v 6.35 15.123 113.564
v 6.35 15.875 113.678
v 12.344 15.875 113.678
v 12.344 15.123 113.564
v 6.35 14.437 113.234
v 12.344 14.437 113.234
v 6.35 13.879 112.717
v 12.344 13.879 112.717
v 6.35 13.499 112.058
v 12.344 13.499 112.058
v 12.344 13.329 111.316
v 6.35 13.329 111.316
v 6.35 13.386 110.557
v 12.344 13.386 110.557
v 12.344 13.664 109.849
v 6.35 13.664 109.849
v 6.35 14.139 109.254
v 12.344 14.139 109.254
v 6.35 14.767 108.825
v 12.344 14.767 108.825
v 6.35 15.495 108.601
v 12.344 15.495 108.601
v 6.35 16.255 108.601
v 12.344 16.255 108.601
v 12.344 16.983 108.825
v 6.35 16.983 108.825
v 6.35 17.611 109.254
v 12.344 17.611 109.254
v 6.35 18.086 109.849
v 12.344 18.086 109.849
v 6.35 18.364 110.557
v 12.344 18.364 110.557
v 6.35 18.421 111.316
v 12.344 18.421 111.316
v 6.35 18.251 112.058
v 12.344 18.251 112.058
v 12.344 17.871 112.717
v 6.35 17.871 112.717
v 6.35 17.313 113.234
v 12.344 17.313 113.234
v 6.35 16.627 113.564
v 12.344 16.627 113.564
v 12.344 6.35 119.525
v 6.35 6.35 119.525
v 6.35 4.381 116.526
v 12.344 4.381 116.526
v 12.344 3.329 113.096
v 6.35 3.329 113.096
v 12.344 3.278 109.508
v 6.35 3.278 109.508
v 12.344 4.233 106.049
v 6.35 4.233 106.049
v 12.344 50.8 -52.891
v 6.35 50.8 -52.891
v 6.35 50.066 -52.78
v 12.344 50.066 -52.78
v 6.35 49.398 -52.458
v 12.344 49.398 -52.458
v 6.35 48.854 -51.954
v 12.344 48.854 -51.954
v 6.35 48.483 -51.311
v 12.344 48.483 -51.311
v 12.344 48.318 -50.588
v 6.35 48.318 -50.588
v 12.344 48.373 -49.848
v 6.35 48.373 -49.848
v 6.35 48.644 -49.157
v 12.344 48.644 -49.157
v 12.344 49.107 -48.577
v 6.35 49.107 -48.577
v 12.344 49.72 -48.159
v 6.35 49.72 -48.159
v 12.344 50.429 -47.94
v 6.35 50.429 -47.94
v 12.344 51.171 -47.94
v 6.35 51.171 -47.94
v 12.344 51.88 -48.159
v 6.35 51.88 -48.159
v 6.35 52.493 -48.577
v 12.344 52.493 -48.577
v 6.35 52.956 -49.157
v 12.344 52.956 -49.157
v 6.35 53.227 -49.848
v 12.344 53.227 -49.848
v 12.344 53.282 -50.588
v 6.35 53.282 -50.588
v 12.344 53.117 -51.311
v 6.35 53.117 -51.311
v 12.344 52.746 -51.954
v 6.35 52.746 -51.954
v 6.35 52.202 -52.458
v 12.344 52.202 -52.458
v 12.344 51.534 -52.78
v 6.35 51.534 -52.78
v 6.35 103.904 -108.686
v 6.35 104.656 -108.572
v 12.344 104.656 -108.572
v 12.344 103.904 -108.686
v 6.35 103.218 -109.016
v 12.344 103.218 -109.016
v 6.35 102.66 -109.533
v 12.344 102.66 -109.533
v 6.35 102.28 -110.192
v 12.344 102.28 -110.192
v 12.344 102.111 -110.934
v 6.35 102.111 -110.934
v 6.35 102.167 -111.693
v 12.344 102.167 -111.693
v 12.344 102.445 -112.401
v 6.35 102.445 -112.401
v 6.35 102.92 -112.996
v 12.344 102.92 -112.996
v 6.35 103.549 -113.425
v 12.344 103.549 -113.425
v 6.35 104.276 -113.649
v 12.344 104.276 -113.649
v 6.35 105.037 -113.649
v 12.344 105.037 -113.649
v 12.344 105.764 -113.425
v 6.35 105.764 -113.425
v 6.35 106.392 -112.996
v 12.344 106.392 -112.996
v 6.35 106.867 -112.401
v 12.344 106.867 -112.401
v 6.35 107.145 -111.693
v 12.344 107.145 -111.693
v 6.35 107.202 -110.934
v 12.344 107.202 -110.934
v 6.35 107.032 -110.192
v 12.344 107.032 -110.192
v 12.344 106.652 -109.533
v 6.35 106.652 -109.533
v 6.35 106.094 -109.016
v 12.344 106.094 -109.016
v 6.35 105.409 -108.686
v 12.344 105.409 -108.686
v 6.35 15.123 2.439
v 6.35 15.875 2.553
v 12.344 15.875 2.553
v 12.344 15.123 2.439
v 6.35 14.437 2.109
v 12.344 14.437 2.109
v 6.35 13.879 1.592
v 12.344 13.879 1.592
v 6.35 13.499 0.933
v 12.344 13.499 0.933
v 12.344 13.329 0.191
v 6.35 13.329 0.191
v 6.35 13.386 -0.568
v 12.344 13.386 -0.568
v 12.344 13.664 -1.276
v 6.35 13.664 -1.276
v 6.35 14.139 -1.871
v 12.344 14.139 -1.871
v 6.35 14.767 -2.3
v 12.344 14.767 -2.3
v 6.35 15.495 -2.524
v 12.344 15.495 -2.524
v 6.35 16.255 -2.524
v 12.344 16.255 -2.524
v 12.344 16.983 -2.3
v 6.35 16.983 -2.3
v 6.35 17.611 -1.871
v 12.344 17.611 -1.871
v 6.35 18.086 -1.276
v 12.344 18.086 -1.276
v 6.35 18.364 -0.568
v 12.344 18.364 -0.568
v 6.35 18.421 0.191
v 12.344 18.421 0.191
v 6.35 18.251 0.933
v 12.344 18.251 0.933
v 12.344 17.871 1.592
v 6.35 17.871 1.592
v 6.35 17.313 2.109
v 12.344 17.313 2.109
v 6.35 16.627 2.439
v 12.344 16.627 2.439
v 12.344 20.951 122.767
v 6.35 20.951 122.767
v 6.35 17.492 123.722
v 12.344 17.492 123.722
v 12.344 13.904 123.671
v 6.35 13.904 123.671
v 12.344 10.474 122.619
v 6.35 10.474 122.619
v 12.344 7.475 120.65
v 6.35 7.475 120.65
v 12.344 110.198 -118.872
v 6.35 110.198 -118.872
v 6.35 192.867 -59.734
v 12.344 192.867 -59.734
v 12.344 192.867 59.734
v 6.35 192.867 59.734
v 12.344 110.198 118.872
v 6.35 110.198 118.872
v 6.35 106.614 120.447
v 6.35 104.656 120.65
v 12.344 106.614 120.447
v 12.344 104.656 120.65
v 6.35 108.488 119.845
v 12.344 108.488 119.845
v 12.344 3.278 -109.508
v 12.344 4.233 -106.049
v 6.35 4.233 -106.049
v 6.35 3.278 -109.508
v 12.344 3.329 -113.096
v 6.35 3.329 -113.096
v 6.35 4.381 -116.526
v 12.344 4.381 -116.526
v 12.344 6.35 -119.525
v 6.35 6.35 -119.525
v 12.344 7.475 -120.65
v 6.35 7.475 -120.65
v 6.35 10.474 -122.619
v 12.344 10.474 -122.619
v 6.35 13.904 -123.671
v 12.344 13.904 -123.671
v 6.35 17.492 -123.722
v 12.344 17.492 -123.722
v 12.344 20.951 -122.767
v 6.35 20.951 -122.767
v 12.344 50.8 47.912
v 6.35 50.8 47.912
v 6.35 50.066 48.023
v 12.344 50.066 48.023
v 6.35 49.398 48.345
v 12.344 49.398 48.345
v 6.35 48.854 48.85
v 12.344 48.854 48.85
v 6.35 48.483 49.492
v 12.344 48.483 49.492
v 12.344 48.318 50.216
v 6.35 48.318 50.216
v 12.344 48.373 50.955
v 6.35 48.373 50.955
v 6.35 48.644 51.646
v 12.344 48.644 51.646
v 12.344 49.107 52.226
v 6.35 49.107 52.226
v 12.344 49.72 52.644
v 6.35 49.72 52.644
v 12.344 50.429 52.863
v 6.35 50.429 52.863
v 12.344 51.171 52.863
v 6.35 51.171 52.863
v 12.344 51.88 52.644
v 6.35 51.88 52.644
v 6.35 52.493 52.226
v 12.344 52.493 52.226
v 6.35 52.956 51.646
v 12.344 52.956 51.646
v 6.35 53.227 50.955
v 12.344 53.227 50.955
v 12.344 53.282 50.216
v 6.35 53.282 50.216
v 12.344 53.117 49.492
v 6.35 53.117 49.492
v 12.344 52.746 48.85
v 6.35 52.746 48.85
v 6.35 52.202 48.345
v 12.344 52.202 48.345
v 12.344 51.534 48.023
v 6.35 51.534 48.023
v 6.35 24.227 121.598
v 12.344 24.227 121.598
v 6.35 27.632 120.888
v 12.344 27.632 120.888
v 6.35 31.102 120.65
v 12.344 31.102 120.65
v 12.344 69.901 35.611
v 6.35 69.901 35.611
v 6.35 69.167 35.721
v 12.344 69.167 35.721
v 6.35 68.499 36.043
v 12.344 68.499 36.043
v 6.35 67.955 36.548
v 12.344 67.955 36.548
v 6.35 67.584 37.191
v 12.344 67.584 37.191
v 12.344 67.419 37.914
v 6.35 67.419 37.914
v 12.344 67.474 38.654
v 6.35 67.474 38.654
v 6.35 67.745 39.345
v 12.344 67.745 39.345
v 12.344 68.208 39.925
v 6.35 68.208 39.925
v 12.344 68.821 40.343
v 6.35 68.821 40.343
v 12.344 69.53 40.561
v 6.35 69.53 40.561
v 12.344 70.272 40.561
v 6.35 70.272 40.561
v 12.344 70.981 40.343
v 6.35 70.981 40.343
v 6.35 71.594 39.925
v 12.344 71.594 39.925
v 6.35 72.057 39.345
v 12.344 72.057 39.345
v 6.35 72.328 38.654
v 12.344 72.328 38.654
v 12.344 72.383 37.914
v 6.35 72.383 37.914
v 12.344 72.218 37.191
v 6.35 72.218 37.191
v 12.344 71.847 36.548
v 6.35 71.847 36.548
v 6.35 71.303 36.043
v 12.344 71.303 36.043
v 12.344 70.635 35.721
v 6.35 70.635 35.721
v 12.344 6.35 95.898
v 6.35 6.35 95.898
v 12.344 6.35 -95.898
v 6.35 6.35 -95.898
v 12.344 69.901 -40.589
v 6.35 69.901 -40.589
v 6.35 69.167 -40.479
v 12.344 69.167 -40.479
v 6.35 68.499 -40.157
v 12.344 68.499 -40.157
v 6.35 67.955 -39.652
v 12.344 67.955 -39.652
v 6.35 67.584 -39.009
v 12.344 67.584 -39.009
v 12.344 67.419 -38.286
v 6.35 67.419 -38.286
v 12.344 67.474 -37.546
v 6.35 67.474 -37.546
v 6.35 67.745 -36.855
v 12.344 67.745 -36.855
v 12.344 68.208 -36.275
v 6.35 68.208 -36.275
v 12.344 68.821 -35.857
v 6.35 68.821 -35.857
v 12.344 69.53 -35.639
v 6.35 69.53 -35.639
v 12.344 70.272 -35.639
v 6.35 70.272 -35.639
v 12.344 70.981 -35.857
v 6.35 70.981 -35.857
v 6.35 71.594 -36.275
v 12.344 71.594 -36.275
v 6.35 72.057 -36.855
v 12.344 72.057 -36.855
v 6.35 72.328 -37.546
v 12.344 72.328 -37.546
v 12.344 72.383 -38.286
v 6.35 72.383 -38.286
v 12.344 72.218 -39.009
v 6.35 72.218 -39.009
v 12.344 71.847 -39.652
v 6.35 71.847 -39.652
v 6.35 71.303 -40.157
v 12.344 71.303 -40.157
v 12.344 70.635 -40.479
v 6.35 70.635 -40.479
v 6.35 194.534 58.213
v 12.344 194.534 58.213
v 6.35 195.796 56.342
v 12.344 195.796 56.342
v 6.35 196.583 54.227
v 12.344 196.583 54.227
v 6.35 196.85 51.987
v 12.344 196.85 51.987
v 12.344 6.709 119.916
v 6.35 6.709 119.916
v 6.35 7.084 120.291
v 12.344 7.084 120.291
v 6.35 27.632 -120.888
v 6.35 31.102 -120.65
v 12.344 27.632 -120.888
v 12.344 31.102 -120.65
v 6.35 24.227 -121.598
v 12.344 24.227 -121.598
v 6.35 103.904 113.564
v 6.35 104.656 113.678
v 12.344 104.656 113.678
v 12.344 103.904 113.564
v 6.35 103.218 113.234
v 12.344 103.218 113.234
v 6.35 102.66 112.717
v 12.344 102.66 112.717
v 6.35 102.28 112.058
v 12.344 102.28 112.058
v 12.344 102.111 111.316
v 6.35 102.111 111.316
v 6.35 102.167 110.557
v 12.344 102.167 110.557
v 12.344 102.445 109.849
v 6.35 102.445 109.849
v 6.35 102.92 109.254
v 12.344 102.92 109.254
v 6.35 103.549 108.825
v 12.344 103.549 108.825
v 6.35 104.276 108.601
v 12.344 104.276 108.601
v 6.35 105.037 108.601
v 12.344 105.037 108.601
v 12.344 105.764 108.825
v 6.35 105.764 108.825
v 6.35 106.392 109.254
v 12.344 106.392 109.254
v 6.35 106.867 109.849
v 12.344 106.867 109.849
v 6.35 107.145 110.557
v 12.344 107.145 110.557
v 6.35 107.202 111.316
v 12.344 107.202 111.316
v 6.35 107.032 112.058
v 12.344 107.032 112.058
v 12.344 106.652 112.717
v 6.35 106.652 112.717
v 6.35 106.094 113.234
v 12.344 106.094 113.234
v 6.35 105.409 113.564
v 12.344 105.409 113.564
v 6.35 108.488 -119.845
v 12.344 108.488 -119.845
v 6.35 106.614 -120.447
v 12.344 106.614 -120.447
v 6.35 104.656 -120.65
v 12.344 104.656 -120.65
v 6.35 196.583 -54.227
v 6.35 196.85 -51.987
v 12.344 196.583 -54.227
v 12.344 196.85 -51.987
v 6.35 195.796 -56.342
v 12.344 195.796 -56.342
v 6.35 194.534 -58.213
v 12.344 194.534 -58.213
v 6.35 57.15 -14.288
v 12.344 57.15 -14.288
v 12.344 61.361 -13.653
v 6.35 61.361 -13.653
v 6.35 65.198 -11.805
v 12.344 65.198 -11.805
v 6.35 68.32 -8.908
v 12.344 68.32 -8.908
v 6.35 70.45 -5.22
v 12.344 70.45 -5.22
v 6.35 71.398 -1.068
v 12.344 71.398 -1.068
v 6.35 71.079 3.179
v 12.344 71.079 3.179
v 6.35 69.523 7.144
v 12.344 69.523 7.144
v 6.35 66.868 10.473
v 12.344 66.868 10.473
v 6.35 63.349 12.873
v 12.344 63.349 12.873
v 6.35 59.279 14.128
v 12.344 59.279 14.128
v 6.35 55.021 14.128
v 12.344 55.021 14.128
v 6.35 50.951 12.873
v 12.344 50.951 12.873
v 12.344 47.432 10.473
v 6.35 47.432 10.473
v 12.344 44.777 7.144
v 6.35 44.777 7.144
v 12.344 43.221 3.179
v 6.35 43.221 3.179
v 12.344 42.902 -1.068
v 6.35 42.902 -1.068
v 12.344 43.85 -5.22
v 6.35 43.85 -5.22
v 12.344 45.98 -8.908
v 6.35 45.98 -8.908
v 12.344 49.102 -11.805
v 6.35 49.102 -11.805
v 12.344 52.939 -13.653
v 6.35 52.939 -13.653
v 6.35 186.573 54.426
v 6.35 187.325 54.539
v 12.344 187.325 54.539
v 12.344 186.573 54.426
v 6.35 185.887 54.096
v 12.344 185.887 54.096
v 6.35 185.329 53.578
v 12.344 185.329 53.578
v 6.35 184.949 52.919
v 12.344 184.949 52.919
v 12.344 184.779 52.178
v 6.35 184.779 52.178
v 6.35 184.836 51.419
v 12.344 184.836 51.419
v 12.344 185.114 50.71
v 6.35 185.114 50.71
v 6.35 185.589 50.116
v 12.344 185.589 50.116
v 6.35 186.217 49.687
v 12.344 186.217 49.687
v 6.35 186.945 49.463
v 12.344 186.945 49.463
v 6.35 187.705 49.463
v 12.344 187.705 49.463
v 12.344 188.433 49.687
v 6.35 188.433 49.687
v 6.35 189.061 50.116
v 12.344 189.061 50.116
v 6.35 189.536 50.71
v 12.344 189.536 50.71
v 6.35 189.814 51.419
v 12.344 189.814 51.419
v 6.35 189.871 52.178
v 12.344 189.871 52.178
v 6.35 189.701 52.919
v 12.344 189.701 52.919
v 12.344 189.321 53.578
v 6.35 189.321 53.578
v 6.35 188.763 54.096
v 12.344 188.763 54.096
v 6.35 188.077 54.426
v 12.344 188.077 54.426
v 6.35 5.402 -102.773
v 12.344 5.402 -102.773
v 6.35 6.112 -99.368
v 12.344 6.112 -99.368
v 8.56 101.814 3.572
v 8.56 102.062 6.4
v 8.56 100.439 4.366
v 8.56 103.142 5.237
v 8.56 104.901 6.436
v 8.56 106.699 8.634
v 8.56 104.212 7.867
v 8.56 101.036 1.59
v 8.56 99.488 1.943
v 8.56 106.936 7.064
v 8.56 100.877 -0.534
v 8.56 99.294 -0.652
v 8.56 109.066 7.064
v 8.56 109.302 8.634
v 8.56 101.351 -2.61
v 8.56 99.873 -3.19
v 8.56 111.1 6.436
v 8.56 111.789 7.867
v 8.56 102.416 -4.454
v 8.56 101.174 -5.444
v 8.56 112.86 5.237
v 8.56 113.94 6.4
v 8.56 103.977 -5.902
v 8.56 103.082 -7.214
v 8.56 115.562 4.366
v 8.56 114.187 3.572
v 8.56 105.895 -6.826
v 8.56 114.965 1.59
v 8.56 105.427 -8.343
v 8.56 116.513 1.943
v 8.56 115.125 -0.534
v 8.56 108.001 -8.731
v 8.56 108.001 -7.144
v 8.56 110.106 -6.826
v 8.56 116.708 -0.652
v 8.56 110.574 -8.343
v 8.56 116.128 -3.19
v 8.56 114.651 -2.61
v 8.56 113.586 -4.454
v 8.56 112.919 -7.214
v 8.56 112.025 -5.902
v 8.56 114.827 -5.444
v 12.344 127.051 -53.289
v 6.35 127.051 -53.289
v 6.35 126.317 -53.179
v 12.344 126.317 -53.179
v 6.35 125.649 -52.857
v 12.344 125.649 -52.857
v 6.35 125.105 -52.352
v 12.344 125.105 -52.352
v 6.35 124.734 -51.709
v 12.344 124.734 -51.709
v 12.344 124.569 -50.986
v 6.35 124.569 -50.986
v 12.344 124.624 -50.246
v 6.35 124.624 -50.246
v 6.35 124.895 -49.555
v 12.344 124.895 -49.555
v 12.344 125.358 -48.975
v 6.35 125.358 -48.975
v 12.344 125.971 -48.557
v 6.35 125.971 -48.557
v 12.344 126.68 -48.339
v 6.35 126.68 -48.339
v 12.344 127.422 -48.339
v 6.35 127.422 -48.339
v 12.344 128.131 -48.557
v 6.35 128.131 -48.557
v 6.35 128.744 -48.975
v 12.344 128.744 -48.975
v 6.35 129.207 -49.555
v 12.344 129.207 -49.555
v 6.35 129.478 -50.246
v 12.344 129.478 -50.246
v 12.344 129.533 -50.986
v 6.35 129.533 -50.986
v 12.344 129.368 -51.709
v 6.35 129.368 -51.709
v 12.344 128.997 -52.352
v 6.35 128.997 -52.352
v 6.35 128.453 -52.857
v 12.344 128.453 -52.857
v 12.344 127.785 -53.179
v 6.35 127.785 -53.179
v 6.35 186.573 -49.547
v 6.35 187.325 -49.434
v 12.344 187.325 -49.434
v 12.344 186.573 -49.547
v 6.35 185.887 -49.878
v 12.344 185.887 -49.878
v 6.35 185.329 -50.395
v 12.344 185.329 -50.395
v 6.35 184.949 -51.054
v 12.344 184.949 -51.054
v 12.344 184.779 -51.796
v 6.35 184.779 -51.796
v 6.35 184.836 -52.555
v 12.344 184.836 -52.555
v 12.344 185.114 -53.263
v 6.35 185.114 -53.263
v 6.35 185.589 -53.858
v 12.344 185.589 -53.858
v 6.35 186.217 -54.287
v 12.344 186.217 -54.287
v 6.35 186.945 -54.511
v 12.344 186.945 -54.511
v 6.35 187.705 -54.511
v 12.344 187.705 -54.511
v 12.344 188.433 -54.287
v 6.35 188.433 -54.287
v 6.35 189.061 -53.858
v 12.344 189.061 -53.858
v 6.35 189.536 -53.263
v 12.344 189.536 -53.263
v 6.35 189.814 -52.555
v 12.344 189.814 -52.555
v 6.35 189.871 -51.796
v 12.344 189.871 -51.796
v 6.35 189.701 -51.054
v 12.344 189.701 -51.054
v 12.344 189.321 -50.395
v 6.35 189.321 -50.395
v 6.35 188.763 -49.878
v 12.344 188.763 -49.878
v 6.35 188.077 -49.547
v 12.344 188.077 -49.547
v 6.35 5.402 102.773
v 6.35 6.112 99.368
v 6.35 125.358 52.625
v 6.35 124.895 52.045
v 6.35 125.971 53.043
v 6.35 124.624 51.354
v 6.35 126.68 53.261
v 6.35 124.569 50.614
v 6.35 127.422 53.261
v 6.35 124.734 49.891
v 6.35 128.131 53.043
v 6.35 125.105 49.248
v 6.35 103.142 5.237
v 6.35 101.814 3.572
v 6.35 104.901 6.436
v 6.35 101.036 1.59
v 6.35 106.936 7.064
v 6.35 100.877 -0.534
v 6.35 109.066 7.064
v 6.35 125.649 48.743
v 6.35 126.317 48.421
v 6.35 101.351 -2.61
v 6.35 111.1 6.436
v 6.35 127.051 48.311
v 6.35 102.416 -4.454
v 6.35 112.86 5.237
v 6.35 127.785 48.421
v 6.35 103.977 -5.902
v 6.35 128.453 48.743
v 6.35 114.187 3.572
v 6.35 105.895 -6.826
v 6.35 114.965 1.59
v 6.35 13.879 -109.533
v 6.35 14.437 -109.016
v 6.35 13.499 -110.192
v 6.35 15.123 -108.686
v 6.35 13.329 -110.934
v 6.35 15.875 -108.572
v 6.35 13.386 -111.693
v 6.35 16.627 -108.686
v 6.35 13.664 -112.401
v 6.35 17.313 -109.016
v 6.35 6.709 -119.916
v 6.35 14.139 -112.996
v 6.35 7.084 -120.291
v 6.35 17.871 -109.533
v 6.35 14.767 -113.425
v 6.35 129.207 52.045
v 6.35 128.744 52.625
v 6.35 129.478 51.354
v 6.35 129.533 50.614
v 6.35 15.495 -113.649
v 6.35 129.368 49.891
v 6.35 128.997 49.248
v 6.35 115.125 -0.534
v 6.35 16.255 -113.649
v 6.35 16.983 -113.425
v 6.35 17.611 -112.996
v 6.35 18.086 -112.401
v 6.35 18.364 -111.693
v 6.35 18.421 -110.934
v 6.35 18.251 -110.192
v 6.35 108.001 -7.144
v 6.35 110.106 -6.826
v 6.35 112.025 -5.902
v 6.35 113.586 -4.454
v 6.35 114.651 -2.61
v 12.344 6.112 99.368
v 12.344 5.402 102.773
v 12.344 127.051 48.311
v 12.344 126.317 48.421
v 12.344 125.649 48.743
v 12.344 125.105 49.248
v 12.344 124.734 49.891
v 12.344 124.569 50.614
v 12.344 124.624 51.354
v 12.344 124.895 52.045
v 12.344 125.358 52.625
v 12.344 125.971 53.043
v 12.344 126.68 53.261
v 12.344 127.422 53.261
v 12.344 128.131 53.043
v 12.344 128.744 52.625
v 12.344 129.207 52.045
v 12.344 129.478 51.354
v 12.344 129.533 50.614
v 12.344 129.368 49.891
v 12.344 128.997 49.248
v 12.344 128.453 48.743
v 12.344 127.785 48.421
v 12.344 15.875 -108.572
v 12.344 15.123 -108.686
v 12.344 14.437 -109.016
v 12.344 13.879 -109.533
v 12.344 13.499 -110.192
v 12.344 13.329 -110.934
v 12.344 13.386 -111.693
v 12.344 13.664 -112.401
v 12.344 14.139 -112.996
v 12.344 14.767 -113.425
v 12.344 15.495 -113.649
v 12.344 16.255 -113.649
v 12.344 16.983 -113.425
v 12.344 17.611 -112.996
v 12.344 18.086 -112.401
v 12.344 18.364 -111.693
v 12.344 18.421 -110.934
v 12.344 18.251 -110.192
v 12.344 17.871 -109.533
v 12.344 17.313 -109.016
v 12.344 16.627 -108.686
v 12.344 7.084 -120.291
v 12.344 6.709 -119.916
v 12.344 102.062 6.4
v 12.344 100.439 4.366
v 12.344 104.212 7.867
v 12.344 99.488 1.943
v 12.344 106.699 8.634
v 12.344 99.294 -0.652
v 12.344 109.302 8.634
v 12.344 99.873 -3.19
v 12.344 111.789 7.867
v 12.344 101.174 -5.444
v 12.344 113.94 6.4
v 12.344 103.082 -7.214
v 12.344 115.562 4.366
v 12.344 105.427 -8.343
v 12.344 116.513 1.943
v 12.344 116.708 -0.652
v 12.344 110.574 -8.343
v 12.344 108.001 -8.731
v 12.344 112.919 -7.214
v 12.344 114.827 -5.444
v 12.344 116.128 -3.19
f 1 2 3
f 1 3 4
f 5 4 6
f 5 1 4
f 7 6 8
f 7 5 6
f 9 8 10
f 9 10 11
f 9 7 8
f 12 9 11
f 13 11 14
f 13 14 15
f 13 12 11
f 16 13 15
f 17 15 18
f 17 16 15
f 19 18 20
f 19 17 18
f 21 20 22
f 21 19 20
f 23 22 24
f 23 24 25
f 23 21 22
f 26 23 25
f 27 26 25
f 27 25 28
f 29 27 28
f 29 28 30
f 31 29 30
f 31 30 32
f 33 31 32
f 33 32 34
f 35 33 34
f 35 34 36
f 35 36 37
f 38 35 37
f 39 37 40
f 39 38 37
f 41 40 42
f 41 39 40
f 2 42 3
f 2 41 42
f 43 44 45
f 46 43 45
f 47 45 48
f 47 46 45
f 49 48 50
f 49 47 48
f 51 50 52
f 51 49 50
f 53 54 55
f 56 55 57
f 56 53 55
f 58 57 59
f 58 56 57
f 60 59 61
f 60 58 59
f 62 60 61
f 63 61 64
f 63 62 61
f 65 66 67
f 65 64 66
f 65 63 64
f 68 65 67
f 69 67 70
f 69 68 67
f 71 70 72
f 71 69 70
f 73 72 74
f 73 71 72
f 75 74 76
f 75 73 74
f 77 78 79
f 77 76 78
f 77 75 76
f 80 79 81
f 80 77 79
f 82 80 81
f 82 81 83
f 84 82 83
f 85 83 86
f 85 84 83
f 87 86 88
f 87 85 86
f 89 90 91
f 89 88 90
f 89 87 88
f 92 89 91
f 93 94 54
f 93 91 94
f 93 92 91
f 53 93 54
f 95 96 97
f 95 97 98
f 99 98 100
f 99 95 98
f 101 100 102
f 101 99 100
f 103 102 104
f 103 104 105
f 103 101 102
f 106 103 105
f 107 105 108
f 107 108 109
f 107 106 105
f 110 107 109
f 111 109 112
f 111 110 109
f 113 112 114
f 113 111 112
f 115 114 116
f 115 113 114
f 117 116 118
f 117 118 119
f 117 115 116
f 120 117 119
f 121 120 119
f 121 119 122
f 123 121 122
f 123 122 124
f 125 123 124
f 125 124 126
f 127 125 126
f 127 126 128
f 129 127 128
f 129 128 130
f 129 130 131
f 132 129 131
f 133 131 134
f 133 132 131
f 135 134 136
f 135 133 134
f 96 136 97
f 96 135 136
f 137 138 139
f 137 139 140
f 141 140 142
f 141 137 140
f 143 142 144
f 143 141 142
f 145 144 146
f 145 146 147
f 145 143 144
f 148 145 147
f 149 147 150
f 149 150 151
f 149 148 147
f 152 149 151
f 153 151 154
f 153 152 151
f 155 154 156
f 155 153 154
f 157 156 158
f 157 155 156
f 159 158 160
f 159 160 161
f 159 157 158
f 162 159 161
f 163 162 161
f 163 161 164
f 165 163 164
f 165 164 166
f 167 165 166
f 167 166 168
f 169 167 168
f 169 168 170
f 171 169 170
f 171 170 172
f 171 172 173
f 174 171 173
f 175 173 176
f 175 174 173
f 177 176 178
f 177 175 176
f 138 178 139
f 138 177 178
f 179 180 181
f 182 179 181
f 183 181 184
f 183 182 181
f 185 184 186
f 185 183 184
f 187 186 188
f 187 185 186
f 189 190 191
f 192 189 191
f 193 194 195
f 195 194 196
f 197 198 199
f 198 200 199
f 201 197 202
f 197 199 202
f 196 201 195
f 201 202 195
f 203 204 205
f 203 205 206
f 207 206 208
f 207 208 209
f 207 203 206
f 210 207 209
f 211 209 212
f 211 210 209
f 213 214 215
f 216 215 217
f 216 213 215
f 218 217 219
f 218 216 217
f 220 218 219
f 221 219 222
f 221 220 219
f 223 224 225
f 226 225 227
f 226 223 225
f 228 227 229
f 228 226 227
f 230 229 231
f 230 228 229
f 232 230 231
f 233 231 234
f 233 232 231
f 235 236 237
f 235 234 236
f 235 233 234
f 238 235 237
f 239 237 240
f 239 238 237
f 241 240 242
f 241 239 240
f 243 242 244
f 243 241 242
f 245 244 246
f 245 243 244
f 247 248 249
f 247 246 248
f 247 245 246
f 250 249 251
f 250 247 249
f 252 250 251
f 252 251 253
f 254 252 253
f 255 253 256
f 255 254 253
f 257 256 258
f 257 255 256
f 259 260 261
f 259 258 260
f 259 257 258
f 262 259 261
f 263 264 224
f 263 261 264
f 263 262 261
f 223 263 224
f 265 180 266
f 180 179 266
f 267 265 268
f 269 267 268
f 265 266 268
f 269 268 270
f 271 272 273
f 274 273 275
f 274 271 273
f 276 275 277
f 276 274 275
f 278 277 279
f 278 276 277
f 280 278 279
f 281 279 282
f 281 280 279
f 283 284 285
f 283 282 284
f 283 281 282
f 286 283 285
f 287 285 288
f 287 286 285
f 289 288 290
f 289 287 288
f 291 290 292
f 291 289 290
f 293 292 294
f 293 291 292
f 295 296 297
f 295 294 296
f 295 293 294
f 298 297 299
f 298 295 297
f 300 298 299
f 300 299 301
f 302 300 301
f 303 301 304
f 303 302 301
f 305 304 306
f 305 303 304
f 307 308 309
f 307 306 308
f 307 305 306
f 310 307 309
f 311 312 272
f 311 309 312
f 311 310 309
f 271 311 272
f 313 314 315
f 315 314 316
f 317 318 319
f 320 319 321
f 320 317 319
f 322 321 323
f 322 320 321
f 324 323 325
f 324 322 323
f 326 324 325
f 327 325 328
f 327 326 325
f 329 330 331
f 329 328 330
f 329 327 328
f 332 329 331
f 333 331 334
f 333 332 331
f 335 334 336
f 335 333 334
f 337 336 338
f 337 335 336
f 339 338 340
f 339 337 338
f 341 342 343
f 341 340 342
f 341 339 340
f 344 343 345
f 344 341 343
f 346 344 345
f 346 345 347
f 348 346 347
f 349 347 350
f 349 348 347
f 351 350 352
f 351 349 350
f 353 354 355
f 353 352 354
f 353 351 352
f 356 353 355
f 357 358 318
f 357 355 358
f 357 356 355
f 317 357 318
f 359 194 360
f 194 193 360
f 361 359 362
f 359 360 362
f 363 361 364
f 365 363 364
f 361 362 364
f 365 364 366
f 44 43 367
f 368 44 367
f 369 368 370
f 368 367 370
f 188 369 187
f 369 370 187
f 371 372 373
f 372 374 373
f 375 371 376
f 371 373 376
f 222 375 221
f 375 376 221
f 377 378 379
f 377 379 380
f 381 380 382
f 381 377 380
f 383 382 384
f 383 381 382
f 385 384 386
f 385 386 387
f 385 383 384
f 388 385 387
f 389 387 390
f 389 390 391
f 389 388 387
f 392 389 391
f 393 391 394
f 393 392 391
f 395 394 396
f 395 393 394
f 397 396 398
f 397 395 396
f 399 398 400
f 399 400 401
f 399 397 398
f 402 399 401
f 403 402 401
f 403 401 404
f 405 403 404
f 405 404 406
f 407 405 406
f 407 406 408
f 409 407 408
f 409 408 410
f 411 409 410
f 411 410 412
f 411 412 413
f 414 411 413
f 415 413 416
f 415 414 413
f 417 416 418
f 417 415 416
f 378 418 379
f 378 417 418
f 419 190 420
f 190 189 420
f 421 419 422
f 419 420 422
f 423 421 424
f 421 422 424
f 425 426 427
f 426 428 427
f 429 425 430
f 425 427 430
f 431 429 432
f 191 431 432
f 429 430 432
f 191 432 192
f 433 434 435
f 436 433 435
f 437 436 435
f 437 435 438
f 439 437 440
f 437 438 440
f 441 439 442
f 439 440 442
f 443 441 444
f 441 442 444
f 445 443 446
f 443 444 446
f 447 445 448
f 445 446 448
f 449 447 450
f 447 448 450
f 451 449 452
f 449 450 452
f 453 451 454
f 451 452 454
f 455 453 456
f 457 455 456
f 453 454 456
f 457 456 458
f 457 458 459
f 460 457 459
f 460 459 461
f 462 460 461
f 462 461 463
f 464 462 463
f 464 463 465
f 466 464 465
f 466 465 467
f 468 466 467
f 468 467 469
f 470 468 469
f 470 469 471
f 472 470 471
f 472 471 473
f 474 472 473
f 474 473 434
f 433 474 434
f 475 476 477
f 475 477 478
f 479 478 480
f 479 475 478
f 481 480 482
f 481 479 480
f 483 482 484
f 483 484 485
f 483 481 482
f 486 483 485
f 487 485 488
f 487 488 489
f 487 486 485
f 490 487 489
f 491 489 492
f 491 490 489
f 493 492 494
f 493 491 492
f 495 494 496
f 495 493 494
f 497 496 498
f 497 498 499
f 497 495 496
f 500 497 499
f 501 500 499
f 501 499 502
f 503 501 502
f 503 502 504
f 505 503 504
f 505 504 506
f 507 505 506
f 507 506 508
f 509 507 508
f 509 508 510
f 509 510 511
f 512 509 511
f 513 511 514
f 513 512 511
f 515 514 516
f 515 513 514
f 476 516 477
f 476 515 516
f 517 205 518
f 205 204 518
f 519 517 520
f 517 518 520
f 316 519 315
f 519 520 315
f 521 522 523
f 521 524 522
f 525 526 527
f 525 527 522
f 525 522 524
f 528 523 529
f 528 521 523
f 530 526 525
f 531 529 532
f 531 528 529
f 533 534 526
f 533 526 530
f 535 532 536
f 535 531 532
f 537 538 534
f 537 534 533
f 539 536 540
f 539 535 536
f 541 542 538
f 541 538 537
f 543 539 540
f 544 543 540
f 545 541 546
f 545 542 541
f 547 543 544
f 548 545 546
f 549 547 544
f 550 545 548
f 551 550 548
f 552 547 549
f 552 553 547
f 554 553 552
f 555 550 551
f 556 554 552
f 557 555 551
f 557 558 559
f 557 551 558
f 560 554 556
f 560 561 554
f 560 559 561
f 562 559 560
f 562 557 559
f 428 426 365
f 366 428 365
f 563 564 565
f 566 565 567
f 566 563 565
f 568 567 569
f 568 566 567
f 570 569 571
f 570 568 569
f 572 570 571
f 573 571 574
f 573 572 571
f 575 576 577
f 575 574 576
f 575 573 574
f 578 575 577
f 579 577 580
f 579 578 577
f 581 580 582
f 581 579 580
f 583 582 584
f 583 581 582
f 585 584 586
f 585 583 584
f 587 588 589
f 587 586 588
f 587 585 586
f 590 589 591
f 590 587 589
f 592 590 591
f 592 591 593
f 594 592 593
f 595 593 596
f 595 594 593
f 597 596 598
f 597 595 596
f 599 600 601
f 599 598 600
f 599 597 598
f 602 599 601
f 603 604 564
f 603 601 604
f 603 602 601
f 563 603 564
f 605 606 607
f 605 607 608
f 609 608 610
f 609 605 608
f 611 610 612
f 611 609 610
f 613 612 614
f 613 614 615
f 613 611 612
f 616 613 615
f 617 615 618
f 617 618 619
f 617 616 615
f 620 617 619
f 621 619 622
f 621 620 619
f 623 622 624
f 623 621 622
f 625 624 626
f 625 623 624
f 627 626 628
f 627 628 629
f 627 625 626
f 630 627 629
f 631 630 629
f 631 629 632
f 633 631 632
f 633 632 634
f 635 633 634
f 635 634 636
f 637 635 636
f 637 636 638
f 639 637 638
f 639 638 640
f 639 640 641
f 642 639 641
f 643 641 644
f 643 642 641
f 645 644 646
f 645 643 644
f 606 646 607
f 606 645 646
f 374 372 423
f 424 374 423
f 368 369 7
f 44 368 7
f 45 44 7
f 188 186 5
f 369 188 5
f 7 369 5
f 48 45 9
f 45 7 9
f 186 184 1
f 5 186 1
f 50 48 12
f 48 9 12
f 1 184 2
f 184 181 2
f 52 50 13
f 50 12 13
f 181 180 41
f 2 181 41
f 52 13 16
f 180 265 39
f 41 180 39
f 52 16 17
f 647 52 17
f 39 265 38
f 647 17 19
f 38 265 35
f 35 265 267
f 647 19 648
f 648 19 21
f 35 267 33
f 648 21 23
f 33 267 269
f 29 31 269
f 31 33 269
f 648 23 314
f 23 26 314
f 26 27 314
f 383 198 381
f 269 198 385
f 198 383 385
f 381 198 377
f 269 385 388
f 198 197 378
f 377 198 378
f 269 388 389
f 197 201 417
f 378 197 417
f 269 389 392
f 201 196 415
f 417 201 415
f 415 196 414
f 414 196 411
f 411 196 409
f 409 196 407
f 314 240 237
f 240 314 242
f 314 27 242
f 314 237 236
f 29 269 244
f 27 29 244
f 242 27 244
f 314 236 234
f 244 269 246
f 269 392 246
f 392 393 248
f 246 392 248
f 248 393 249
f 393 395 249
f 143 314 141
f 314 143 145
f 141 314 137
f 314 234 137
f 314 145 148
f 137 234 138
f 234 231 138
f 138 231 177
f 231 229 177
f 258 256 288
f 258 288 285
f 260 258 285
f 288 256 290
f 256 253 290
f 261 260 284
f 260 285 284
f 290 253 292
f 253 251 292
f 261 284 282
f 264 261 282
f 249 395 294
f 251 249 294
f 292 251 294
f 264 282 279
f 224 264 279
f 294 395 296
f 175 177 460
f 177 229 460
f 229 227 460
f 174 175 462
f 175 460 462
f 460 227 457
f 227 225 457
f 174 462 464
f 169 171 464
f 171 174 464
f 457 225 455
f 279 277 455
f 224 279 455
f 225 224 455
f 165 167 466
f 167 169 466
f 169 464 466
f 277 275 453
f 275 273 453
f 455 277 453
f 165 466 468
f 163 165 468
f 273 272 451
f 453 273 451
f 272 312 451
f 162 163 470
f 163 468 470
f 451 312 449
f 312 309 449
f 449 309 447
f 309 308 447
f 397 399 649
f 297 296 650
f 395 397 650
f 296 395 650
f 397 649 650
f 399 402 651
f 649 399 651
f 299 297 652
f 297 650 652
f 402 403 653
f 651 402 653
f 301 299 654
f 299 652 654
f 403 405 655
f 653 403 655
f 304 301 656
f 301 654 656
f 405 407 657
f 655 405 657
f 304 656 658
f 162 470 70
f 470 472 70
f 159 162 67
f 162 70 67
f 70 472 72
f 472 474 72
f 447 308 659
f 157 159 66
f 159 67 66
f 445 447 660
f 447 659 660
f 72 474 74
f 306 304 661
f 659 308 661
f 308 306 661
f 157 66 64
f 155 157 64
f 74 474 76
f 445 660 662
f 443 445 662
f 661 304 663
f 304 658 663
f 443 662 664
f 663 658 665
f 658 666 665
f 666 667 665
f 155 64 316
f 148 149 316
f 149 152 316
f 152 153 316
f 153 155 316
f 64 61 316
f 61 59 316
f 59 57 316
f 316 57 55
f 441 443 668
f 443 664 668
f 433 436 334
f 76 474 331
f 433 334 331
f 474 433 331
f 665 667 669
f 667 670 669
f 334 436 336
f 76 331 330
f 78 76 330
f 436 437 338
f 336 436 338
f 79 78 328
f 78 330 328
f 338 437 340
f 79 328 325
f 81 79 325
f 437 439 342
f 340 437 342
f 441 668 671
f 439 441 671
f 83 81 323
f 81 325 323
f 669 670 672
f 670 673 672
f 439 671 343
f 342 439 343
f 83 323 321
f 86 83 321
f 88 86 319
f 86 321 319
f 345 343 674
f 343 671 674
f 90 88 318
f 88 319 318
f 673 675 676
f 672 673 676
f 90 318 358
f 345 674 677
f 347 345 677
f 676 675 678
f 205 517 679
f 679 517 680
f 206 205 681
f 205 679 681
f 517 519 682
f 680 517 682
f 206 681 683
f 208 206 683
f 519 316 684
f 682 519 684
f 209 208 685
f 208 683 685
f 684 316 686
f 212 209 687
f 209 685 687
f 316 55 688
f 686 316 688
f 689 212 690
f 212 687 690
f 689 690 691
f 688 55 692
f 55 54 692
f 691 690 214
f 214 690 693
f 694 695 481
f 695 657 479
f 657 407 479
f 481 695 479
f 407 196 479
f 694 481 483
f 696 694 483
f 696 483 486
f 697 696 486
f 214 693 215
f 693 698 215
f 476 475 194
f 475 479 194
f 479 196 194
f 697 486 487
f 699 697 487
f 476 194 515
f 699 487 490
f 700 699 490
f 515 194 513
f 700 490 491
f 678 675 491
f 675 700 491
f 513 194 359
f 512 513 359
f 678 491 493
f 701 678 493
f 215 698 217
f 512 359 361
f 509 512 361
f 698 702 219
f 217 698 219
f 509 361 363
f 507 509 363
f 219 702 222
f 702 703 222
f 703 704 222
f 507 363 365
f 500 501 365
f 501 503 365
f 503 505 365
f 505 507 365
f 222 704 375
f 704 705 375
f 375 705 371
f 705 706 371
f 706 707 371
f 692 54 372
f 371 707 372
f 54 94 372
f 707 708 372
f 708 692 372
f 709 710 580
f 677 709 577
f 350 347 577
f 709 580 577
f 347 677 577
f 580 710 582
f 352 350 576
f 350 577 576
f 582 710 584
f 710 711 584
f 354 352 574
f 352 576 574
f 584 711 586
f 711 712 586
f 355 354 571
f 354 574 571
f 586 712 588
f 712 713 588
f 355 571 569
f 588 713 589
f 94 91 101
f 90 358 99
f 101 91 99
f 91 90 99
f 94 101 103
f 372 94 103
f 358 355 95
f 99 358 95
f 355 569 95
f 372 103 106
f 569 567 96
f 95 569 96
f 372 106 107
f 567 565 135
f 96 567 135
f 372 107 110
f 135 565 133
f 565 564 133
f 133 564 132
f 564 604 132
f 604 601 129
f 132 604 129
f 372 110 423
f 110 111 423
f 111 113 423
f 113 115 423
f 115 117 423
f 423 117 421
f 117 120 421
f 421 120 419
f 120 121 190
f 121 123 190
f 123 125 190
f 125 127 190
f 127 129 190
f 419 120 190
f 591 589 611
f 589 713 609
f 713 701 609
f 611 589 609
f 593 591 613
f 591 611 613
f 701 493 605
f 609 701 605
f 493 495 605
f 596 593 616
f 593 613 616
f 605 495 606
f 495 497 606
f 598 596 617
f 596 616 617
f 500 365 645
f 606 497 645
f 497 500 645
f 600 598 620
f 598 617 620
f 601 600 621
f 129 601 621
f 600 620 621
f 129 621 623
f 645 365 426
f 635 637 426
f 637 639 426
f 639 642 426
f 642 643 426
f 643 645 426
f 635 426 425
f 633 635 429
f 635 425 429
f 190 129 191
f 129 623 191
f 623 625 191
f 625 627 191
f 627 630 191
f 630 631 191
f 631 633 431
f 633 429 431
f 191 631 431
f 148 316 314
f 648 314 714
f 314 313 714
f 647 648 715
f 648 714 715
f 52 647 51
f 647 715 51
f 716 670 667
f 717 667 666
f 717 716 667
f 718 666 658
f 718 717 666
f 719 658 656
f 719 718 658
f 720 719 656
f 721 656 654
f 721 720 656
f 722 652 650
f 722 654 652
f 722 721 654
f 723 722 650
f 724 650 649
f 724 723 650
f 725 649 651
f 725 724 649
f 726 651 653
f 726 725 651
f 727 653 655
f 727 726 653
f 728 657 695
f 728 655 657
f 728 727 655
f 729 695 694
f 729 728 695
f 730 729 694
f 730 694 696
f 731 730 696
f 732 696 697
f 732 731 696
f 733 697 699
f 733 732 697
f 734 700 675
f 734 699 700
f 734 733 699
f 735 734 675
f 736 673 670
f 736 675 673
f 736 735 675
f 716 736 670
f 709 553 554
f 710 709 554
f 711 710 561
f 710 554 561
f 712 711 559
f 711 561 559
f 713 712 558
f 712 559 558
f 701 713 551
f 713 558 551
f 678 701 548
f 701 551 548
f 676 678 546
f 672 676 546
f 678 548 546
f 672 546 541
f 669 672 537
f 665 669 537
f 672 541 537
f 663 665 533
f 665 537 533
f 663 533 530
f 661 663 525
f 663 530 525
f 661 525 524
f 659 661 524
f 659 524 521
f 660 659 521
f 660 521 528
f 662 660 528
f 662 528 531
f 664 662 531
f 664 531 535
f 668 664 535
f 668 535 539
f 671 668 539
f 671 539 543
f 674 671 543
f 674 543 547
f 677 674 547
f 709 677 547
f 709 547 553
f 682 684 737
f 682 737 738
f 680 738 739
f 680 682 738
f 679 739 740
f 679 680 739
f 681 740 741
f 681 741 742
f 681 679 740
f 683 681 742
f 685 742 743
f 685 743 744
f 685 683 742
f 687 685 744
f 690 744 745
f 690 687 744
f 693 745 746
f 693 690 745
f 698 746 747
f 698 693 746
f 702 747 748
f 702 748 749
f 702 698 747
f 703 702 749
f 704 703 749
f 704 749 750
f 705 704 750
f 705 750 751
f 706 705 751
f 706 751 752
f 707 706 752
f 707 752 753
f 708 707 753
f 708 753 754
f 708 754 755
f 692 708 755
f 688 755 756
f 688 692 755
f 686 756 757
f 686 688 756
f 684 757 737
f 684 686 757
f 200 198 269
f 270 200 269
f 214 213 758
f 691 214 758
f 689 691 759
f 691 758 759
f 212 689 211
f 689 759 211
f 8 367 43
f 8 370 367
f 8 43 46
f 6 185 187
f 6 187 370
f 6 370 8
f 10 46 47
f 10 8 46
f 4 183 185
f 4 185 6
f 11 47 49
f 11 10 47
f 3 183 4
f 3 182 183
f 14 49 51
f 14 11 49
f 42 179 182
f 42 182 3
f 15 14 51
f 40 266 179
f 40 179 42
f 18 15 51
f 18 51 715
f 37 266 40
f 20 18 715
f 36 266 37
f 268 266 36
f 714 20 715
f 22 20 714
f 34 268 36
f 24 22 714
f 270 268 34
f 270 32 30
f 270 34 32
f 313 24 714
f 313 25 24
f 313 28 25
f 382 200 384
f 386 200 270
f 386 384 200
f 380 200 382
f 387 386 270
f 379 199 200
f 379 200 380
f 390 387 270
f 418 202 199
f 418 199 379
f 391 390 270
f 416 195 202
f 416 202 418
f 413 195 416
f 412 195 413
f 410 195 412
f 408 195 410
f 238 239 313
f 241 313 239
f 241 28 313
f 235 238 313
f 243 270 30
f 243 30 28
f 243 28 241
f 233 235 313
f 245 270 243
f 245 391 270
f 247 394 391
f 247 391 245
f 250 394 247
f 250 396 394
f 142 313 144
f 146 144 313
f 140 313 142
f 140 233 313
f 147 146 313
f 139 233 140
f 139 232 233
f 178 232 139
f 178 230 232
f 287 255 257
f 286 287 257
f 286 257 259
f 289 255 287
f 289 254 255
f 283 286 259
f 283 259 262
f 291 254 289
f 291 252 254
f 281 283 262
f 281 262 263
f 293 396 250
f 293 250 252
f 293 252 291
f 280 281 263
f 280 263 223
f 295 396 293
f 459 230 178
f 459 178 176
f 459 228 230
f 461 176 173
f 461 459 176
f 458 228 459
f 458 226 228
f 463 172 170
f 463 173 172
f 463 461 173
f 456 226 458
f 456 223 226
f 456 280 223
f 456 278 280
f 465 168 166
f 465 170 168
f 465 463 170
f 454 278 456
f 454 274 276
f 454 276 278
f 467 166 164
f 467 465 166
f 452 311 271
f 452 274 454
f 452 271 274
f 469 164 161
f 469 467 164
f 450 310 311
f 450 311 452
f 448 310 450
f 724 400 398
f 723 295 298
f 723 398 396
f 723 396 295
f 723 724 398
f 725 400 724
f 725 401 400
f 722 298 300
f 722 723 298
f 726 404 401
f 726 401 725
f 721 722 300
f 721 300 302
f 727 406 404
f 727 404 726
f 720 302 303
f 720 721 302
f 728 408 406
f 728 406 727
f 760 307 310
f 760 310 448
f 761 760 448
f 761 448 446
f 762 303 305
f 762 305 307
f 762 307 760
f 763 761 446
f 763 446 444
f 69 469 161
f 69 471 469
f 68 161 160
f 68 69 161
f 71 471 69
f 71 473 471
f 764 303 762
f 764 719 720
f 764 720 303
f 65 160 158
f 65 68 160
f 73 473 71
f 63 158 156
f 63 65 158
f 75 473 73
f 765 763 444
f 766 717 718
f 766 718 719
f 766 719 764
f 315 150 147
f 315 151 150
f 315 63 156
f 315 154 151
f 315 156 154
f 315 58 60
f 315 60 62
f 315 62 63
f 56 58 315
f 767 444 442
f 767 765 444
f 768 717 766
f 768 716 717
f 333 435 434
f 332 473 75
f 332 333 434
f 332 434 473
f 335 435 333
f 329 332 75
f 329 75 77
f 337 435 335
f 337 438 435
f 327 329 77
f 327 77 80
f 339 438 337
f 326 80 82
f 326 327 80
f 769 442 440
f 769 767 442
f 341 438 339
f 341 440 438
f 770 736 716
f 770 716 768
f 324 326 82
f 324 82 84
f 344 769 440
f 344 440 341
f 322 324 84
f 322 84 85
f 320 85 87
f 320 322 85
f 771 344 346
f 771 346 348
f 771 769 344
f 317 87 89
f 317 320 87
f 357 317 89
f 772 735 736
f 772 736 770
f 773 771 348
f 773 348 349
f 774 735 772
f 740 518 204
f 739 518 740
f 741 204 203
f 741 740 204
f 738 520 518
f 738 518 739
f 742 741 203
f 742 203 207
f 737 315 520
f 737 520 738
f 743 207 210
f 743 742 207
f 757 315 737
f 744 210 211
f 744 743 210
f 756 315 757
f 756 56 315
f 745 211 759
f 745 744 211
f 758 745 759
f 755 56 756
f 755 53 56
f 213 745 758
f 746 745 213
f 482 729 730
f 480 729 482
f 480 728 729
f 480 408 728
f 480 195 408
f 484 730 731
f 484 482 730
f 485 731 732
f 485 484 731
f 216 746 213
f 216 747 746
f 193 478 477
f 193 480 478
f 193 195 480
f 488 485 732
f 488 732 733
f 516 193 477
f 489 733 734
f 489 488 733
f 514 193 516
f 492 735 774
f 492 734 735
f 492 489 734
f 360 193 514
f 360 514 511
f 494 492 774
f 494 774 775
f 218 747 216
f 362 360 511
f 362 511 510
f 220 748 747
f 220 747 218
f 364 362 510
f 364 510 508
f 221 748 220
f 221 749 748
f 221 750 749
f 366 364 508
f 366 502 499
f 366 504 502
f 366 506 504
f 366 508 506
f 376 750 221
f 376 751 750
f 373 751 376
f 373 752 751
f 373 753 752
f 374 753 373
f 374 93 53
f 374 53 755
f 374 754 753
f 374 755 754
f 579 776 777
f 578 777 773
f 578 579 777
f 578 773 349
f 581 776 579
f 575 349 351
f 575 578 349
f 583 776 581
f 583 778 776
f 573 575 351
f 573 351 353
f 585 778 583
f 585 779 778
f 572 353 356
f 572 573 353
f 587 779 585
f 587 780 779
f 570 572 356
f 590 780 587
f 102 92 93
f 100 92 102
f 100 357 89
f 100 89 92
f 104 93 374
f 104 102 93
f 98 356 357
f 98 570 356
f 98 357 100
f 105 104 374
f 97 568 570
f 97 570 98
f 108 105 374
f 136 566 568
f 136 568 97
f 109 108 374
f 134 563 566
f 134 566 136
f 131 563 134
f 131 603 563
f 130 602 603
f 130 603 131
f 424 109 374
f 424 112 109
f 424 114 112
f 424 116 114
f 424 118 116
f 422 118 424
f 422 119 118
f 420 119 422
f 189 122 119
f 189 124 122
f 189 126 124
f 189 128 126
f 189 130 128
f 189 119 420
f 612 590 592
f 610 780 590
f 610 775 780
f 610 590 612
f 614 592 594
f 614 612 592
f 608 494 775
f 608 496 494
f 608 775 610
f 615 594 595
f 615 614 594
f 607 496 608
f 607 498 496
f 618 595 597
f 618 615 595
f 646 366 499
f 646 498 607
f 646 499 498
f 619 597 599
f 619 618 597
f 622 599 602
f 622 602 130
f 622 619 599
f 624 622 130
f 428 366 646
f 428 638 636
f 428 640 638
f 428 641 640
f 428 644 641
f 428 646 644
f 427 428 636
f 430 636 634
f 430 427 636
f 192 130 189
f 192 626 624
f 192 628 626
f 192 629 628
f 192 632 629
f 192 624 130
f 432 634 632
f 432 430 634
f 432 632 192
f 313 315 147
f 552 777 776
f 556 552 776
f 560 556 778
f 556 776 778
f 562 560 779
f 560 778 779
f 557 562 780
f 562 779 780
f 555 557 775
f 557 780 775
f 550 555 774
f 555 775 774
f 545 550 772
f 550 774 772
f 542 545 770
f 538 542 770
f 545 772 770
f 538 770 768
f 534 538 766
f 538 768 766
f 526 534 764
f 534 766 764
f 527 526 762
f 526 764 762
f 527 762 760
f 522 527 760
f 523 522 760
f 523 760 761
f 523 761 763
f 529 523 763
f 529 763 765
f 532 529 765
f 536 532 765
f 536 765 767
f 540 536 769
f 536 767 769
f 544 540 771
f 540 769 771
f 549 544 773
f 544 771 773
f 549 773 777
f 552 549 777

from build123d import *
from build123d.topology import SkipClean

# Parameters (mm, degrees)
ANGLEDBALLAST_DECKFRONT_OUTLINE_R = 2.5527
ANGLEDBALLAST_DECKFRONT_DEPTH     = 6.35
SKETCH1_R                         = 2.5527
BOSS_EXTRUDE1_DEPTH               = 5.9944
SKETCH2_R                         = 7.14375
SKETCH2_R_2                       = 14.2875
CUT_EXTRUDE1_DEPTH                = 344.885135927
F_10_CLEARANCE_HOLE1_AT_2_COUNT   = 2
F_10_CLEARANCE_HOLE1_AT_2_PITCH   = 58.544107304
F_10_CLEARANCE_HOLE1_AT_3_COUNT   = 2
F_10_CLEARANCE_HOLE1_AT_3_PITCH   = 105.685062805
F_10_CLEARANCE_HOLE1_AT_4_COUNT   = 2
F_10_CLEARANCE_HOLE1_AT_4_PITCH   = 76.2
F_10_CLEARANCE_HOLE1_AT_5_COUNT   = 2
F_10_CLEARANCE_HOLE1_AT_5_PITCH   = 90.539312574
F_10_CLEARANCE_HOLE1_AT_6_COUNT   = 2
F_10_CLEARANCE_HOLE1_AT_6_PITCH   = 22.719352983
SKETCH6_R                         = 12.7
SKETCH6_R_2                       = 2.5527
BOSS_EXTRUDE2_DEPTH               = 5.9944
FILLET1_R                         = 25.4
CUT_EXTRUDE2_DEPTH                = 233.633802265
FILLET2_R                         = 9.525
SKETCH8_R                         = 8.73125
CUT_EXTRUDE3_DEPTH                = 3.7846


# Read off the part's stored shape, not the designer's step: Surface Bodies1
with BuildPart() as part:
    # AngledBallast_DeckFront outline → AngledBallast_DeckFront (new body)
    with BuildSketch(Plane.YZ):
        Polygon((227.241295543, 95.25), (0, 257.81), (0, -257.81), (227.241295543, -95.25), align=None)
        with Locations((15.875, -111.125)):
            Circle(ANGLEDBALLAST_DECKFRONT_OUTLINE_R, mode=Mode.SUBTRACT)
        with Locations((104.656174089, -111.125)):
            Circle(ANGLEDBALLAST_DECKFRONT_OUTLINE_R, mode=Mode.SUBTRACT)
        with Locations((187.325, -51.986786112)):
            Circle(ANGLEDBALLAST_DECKFRONT_OUTLINE_R, mode=Mode.SUBTRACT)
        with Locations((15.875, 0)):
            Circle(ANGLEDBALLAST_DECKFRONT_OUTLINE_R, mode=Mode.SUBTRACT)
        with Locations((15.875, 111.125)):
            Circle(ANGLEDBALLAST_DECKFRONT_OUTLINE_R, mode=Mode.SUBTRACT)
        Polygon((101.6, -101.6), (25.4, -101.6), (25.4, 101.6), (101.6, 101.6), (177.8, 47.089344398), (177.8, -47.089344398), align=None, mode=Mode.SUBTRACT)
        with Locations((104.656174089, 111.125)):
            Circle(ANGLEDBALLAST_DECKFRONT_OUTLINE_R, mode=Mode.SUBTRACT)
        with Locations((187.325, 51.986786112)):
            Circle(ANGLEDBALLAST_DECKFRONT_OUTLINE_R, mode=Mode.SUBTRACT)
    extrude(amount=ANGLEDBALLAST_DECKFRONT_DEPTH)


with BuildPart() as body_2:
    # Sketch1 → Boss-Extrude1 (new body)
    with BuildSketch(Plane(origin=(6.35, 0, 0), x_dir=(0, 0, -1), z_dir=(1, 0, 0))):
        Polygon((120.65, 107.712348179), (56.884227826, 196.85), (-56.884227826, 196.85), (-120.65, 107.712348179), (-120.65, 6.35), (120.65, 6.35), align=None)
        with Locations(Location((51.986786112, 187.325, 0), (0, 0, 180))):
            Circle(SKETCH1_R, mode=Mode.SUBTRACT)
        with Locations(Location((111.125, 104.656174089, 0), (0, 0, 180))):
            Circle(SKETCH1_R, mode=Mode.SUBTRACT)
        with Locations(Location((0, 15.875, 0), (0, 0, 180))):
            Circle(SKETCH1_R, mode=Mode.SUBTRACT)
        with Locations(Location((111.125, 15.875, 0), (0, 0, 180))):
            Circle(SKETCH1_R, mode=Mode.SUBTRACT)
        with Locations(Location((-111.125, 15.875, 0), (0, 0, 180))):
            Circle(SKETCH1_R, mode=Mode.SUBTRACT)
        with Locations(Location((-111.125, 104.656174089, 0), (0, 0, 180))):
            Circle(SKETCH1_R, mode=Mode.SUBTRACT)
        with Locations(Location((-51.986786112, 187.325, 0), (0, 0, 180))):
            Circle(SKETCH1_R, mode=Mode.SUBTRACT)
    extrude(amount=BOSS_EXTRUDE1_DEPTH)

    # Sketch2 → Cut-Extrude1 (cut, through all)
    with BuildSketch(Plane(origin=(12.3444, 0, 0), x_dir=(0, 0, -1), z_dir=(1, 0, 0))):
        with Locations((0, 108.0008)):
            Circle(SKETCH2_R)
        with Locations((0, 57.15)):
            Circle(SKETCH2_R_2)
    extrude(amount=-CUT_EXTRUDE1_DEPTH, mode=Mode.SUBTRACT)

    # Sketch5 → #10 Clearance Hole1 (revolve, cut)
    with BuildSketch(Plane(origin=(12.3444, 69.9008, -38.1), x_dir=(0, 0, -1), z_dir=(0, 1, 0))):
        Polygon((0, 0), (0, 13.433662253), (2.4892, 11.938), (2.4892, 0), align=None)
    f_10_clearance_hole1 = revolve(axis=Axis((18.6944, 69.9008, -38.1), (-1, 0, 0)), mode=Mode.SUBTRACT)

    # #10 Clearance Hole1 at 2: #10 Clearance Hole1 ×2
    with Locations(*[Vector(0, 0.9761870601839528, -0.2169304578186562) * (i * F_10_CLEARANCE_HOLE1_AT_2_PITCH) for i in range(1, F_10_CLEARANCE_HOLE1_AT_2_COUNT)]):
        add(f_10_clearance_hole1, mode=Mode.SUBTRACT)

    # #10 Clearance Hole1 at 3: #10 Clearance Hole1 ×2
    with Locations(*[Vector(0, 0.5407575913134985, 0.8411784753765537) * (i * F_10_CLEARANCE_HOLE1_AT_3_PITCH) for i in range(1, F_10_CLEARANCE_HOLE1_AT_3_COUNT)]):
        add(f_10_clearance_hole1, mode=Mode.SUBTRACT)

    # #10 Clearance Hole1 at 4: #10 Clearance Hole1 ×2
    with Locations(*[(0, 0, i * F_10_CLEARANCE_HOLE1_AT_4_PITCH) for i in range(1, F_10_CLEARANCE_HOLE1_AT_4_COUNT)]):
        add(f_10_clearance_hole1, mode=Mode.SUBTRACT)

    # #10 Clearance Hole1 at 5: #10 Clearance Hole1 ×2
    with Locations(*[Vector(0, -0.2109669209657333, 0.9774932011314648) * (i * F_10_CLEARANCE_HOLE1_AT_5_PITCH) for i in range(1, F_10_CLEARANCE_HOLE1_AT_5_COUNT)]):
        add(f_10_clearance_hole1, mode=Mode.SUBTRACT)

    # #10 Clearance Hole1 at 6: #10 Clearance Hole1 ×2
    with Locations(*[Vector(0, -0.8407281674761526, -0.5414574299168776) * (i * F_10_CLEARANCE_HOLE1_AT_6_PITCH) for i in range(1, F_10_CLEARANCE_HOLE1_AT_6_COUNT)]):
        add(f_10_clearance_hole1, mode=Mode.SUBTRACT)

    # Sketch6 → Boss-Extrude2 (add)
    # profile 1 of 2: a face of its own
    with BuildSketch(Plane(origin=(12.3444, 0, 0), x_dir=(0, 0, -1), z_dir=(1, 0, 0))):
        with Locations((-111.125, 15.875)):
            Circle(SKETCH6_R)
        with Locations(Location((-111.125, 15.875, 0), (0, 0, 180))):
            Circle(SKETCH6_R_2, mode=Mode.SUBTRACT)
    # profile 2 of 2: a face of its own
    with BuildSketch(Plane(origin=(12.3444, 0, 0), x_dir=(0, 0, -1), z_dir=(1, 0, 0))):
        with Locations((111.125, 15.875)):
            Circle(SKETCH6_R)
        with Locations(Location((111.125, 15.875, 0), (0, 0, 180))):
            Circle(SKETCH6_R_2, mode=Mode.SUBTRACT)
    extrude(amount=-BOSS_EXTRUDE2_DEPTH)

    # Fillet1
    fillet1_edges = [body_2.edges().sort_by_distance(p)[0] for p in [
        (9.3472, 6.35, 102.724739587),
        (9.3472, 24.275260413, 120.65),
        (9.3472, 6.35, -102.724739587),
        (9.3472, 24.275260413, -120.65),
    ]]
    fillet(fillet1_edges, radius=FILLET1_R)

    # Sketch7 → Cut-Extrude2 (cut, through all)
    with BuildSketch(Plane(origin=(12.3444, 0, 0), x_dir=(0, 0, -1), z_dir=(1, 0, 0))):
        with BuildLine():
            Line((119.525260413, 6.35), (120.65, 6.35))
            Line((120.65, 6.35), (120.65, 7.474739587))
            ThreePointArc((120.65, 7.474739587), (120.105256121, 6.894743879), (119.525260413, 6.35))
        make_face()
        with BuildLine():
            Line((-120.65, 6.35), (-119.525260413, 6.35))
            ThreePointArc((-119.525260413, 6.35), (-120.105256121, 6.894743879), (-120.65, 7.474739587))
            Line((-120.65, 7.474739587), (-120.65, 6.35))
        make_face()
    extrude(amount=-CUT_EXTRUDE2_DEPTH, mode=Mode.SUBTRACT)

    # Fillet2
    fillet2_edges = [body_2.edges().sort_by_distance(p)[0] for p in [
        (9.3472, 107.712348179, 120.65),
        (9.3472, 196.85, 56.884227826),
        (9.3472, 196.85, -56.884227826),
        (9.3472, 107.712348179, -120.65),
    ]]
    fillet(fillet2_edges, radius=FILLET2_R)

    # Sketch8 → Cut-Extrude3 (cut)
    with SkipClean():  # the faces are left unmerged after this step: merging them gives an invalid solid
        with BuildSketch(Plane(origin=(12.3444, 0, 0), x_dir=(0, 0, -1), z_dir=(1, 0, 0))):
            with Locations((0, 108.0008)):
                Circle(SKETCH8_R)
        extrude(amount=-CUT_EXTRUDE3_DEPTH, mode=Mode.SUBTRACT)


solid = body_2.part
